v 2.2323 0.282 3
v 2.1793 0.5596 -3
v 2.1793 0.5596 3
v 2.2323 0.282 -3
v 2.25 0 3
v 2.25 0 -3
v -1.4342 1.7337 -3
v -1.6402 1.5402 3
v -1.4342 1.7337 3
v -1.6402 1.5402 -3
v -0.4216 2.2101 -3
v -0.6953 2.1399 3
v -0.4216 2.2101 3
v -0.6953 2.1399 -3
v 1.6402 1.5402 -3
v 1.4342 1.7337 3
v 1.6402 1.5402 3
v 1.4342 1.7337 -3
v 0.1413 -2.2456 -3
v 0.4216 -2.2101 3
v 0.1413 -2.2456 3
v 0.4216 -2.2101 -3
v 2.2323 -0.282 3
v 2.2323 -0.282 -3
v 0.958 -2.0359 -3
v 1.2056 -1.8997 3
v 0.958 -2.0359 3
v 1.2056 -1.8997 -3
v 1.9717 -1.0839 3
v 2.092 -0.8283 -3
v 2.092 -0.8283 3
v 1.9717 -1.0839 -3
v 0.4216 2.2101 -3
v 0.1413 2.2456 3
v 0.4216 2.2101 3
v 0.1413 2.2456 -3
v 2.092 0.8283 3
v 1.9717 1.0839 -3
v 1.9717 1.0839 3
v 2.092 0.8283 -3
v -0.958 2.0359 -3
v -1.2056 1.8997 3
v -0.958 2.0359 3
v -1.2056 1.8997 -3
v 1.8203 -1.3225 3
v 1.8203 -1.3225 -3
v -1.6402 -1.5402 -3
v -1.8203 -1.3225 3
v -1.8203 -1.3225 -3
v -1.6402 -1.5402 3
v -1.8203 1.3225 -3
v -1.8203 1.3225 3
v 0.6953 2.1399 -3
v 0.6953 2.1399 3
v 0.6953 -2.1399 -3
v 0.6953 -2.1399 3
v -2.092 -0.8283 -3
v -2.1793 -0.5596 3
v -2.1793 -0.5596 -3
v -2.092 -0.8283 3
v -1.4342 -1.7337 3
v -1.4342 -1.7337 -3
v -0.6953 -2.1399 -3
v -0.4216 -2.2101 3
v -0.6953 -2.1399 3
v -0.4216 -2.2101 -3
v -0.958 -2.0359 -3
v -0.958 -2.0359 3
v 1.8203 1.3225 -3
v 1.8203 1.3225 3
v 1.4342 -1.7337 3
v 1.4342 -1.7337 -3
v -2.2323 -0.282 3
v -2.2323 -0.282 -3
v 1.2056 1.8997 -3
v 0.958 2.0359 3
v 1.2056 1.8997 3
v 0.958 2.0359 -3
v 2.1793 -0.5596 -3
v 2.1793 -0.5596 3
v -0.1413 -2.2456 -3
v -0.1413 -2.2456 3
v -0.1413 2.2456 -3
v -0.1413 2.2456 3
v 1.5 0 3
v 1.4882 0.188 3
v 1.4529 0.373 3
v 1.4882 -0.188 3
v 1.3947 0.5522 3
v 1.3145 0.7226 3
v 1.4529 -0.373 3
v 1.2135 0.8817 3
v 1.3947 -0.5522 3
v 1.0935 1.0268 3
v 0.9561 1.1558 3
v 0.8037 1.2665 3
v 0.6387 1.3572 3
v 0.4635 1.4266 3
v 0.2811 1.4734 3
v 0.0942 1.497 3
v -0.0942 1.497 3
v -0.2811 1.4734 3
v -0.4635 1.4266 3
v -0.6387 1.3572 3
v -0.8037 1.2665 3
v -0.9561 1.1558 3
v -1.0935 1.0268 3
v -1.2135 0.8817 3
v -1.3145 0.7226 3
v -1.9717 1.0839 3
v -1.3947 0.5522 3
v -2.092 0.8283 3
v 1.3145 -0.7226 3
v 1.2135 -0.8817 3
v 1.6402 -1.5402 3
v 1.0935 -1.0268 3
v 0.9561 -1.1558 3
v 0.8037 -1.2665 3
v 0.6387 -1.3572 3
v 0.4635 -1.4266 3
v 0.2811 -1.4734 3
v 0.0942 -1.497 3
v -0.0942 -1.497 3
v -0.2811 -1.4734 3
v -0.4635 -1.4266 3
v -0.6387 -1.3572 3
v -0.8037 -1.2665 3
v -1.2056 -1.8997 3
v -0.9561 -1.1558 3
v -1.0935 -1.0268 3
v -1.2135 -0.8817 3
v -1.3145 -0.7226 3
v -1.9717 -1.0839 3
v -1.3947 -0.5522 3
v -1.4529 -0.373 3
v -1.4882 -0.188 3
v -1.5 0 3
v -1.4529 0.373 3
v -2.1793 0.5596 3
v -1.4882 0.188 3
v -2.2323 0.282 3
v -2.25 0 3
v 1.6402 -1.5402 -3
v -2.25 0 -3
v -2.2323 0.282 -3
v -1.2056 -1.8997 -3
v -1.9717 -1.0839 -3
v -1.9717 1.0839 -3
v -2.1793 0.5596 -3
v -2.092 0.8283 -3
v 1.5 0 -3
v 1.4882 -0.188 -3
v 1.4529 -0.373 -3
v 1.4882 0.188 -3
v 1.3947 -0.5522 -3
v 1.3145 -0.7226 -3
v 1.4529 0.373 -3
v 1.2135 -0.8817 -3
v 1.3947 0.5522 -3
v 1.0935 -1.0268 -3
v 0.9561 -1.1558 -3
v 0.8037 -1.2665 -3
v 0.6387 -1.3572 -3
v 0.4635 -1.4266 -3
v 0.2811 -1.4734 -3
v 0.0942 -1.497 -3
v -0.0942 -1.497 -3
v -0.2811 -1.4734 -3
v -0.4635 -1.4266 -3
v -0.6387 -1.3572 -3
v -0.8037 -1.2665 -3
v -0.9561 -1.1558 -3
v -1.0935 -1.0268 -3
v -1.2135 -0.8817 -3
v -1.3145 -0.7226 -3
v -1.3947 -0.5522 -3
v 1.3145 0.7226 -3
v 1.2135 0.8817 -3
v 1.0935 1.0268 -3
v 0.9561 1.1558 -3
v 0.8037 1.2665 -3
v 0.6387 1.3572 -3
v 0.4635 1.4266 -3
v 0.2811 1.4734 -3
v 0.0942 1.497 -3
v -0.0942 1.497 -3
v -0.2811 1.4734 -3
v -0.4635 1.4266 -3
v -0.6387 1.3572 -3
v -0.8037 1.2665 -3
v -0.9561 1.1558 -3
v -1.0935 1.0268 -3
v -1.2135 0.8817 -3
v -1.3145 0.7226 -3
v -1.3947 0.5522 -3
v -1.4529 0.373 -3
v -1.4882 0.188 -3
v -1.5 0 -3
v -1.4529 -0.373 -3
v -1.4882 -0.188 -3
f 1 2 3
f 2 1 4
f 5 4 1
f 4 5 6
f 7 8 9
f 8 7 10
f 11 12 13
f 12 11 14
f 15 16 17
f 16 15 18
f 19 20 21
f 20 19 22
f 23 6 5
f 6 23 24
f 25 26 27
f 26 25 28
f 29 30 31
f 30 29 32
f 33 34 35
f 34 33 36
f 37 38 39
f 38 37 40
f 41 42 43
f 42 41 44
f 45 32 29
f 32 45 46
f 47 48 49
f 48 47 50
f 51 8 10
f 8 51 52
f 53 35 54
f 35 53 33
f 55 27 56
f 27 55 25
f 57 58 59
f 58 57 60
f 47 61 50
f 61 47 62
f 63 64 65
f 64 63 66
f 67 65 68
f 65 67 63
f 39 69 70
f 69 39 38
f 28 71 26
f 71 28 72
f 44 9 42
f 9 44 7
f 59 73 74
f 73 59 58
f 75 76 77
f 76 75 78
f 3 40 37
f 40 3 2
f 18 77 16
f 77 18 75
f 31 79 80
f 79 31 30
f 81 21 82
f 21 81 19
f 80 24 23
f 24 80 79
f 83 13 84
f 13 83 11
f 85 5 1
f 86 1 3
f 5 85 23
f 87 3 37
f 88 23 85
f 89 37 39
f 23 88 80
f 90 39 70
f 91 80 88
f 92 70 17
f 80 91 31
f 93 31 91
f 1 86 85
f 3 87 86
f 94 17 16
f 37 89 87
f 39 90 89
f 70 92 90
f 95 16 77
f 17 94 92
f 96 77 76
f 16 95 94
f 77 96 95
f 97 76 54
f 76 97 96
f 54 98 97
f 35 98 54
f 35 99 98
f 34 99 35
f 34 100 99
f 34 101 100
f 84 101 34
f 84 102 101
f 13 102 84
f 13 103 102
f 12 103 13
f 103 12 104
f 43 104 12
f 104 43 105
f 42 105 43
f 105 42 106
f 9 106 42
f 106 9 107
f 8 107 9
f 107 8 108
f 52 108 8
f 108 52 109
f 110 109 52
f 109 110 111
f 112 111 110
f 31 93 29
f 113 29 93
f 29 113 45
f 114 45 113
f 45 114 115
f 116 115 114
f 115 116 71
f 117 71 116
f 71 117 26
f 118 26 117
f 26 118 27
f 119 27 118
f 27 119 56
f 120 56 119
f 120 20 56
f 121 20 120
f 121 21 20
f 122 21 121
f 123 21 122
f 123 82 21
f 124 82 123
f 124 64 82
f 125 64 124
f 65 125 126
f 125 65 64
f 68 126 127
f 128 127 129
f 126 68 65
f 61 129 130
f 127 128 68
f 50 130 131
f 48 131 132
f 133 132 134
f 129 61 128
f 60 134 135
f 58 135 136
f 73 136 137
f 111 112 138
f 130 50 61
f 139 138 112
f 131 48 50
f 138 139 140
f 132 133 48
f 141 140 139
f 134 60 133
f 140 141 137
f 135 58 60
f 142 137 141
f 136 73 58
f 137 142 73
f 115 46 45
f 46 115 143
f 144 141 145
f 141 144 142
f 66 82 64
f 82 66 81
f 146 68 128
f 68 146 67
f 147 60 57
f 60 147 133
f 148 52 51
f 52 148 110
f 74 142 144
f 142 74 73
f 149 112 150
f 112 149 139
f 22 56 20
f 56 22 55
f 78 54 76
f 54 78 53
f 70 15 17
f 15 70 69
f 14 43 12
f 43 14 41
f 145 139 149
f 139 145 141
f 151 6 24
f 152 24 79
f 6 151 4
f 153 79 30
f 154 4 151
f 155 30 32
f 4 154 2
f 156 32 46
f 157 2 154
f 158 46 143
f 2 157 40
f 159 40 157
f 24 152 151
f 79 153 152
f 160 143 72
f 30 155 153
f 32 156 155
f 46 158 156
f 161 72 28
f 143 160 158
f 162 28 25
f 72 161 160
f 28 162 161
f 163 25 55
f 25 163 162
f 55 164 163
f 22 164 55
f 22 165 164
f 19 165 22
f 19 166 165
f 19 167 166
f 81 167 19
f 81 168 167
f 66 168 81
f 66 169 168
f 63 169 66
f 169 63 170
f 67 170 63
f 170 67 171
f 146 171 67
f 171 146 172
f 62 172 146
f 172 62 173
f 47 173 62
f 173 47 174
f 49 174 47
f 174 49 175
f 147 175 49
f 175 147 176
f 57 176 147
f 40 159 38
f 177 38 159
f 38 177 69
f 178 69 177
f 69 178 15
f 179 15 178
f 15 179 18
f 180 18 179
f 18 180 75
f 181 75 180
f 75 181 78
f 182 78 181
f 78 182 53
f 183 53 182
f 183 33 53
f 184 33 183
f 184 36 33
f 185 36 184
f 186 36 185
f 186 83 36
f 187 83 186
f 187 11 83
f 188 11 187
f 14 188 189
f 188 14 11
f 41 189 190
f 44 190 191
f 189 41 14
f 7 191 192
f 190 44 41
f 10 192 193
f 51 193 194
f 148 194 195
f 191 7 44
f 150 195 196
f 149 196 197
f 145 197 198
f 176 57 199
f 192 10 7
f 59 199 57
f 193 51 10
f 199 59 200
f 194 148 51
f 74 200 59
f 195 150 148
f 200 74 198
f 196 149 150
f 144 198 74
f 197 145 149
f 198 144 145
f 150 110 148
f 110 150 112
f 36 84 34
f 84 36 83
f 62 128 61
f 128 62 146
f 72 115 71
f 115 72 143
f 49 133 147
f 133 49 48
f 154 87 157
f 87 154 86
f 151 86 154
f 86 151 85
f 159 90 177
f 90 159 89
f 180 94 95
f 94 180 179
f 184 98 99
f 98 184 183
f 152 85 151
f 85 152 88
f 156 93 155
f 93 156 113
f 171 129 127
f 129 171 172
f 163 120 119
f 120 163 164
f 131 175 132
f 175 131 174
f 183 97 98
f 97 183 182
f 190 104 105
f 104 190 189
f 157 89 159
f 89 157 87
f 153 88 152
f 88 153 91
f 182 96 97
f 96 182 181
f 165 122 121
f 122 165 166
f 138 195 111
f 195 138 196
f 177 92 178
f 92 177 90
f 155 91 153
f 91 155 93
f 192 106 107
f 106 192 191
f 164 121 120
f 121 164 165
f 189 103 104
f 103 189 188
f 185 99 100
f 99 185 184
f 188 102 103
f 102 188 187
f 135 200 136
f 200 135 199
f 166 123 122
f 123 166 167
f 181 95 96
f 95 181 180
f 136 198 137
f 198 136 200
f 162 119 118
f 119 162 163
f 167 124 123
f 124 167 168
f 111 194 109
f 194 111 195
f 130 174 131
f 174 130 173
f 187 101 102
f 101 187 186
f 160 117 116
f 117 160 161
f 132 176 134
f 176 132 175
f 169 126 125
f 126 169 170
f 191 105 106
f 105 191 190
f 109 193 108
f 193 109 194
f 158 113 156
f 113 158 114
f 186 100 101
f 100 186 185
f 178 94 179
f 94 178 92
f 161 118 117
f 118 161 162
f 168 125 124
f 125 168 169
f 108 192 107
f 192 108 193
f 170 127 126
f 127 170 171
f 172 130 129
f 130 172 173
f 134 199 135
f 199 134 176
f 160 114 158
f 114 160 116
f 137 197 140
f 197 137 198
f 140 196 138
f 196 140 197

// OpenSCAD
$fn = 50;


difference() {
	union() {
		translate(v = [0, 0, -3.0000000000]) {
			cylinder(h = 6, r = 2.2500000000);
		}
	}
	union() {
		translate(v = [0, 0, -100.0000000000]) {
			cylinder(h = 200, r = 1.5000000000);
		}
	}
}
